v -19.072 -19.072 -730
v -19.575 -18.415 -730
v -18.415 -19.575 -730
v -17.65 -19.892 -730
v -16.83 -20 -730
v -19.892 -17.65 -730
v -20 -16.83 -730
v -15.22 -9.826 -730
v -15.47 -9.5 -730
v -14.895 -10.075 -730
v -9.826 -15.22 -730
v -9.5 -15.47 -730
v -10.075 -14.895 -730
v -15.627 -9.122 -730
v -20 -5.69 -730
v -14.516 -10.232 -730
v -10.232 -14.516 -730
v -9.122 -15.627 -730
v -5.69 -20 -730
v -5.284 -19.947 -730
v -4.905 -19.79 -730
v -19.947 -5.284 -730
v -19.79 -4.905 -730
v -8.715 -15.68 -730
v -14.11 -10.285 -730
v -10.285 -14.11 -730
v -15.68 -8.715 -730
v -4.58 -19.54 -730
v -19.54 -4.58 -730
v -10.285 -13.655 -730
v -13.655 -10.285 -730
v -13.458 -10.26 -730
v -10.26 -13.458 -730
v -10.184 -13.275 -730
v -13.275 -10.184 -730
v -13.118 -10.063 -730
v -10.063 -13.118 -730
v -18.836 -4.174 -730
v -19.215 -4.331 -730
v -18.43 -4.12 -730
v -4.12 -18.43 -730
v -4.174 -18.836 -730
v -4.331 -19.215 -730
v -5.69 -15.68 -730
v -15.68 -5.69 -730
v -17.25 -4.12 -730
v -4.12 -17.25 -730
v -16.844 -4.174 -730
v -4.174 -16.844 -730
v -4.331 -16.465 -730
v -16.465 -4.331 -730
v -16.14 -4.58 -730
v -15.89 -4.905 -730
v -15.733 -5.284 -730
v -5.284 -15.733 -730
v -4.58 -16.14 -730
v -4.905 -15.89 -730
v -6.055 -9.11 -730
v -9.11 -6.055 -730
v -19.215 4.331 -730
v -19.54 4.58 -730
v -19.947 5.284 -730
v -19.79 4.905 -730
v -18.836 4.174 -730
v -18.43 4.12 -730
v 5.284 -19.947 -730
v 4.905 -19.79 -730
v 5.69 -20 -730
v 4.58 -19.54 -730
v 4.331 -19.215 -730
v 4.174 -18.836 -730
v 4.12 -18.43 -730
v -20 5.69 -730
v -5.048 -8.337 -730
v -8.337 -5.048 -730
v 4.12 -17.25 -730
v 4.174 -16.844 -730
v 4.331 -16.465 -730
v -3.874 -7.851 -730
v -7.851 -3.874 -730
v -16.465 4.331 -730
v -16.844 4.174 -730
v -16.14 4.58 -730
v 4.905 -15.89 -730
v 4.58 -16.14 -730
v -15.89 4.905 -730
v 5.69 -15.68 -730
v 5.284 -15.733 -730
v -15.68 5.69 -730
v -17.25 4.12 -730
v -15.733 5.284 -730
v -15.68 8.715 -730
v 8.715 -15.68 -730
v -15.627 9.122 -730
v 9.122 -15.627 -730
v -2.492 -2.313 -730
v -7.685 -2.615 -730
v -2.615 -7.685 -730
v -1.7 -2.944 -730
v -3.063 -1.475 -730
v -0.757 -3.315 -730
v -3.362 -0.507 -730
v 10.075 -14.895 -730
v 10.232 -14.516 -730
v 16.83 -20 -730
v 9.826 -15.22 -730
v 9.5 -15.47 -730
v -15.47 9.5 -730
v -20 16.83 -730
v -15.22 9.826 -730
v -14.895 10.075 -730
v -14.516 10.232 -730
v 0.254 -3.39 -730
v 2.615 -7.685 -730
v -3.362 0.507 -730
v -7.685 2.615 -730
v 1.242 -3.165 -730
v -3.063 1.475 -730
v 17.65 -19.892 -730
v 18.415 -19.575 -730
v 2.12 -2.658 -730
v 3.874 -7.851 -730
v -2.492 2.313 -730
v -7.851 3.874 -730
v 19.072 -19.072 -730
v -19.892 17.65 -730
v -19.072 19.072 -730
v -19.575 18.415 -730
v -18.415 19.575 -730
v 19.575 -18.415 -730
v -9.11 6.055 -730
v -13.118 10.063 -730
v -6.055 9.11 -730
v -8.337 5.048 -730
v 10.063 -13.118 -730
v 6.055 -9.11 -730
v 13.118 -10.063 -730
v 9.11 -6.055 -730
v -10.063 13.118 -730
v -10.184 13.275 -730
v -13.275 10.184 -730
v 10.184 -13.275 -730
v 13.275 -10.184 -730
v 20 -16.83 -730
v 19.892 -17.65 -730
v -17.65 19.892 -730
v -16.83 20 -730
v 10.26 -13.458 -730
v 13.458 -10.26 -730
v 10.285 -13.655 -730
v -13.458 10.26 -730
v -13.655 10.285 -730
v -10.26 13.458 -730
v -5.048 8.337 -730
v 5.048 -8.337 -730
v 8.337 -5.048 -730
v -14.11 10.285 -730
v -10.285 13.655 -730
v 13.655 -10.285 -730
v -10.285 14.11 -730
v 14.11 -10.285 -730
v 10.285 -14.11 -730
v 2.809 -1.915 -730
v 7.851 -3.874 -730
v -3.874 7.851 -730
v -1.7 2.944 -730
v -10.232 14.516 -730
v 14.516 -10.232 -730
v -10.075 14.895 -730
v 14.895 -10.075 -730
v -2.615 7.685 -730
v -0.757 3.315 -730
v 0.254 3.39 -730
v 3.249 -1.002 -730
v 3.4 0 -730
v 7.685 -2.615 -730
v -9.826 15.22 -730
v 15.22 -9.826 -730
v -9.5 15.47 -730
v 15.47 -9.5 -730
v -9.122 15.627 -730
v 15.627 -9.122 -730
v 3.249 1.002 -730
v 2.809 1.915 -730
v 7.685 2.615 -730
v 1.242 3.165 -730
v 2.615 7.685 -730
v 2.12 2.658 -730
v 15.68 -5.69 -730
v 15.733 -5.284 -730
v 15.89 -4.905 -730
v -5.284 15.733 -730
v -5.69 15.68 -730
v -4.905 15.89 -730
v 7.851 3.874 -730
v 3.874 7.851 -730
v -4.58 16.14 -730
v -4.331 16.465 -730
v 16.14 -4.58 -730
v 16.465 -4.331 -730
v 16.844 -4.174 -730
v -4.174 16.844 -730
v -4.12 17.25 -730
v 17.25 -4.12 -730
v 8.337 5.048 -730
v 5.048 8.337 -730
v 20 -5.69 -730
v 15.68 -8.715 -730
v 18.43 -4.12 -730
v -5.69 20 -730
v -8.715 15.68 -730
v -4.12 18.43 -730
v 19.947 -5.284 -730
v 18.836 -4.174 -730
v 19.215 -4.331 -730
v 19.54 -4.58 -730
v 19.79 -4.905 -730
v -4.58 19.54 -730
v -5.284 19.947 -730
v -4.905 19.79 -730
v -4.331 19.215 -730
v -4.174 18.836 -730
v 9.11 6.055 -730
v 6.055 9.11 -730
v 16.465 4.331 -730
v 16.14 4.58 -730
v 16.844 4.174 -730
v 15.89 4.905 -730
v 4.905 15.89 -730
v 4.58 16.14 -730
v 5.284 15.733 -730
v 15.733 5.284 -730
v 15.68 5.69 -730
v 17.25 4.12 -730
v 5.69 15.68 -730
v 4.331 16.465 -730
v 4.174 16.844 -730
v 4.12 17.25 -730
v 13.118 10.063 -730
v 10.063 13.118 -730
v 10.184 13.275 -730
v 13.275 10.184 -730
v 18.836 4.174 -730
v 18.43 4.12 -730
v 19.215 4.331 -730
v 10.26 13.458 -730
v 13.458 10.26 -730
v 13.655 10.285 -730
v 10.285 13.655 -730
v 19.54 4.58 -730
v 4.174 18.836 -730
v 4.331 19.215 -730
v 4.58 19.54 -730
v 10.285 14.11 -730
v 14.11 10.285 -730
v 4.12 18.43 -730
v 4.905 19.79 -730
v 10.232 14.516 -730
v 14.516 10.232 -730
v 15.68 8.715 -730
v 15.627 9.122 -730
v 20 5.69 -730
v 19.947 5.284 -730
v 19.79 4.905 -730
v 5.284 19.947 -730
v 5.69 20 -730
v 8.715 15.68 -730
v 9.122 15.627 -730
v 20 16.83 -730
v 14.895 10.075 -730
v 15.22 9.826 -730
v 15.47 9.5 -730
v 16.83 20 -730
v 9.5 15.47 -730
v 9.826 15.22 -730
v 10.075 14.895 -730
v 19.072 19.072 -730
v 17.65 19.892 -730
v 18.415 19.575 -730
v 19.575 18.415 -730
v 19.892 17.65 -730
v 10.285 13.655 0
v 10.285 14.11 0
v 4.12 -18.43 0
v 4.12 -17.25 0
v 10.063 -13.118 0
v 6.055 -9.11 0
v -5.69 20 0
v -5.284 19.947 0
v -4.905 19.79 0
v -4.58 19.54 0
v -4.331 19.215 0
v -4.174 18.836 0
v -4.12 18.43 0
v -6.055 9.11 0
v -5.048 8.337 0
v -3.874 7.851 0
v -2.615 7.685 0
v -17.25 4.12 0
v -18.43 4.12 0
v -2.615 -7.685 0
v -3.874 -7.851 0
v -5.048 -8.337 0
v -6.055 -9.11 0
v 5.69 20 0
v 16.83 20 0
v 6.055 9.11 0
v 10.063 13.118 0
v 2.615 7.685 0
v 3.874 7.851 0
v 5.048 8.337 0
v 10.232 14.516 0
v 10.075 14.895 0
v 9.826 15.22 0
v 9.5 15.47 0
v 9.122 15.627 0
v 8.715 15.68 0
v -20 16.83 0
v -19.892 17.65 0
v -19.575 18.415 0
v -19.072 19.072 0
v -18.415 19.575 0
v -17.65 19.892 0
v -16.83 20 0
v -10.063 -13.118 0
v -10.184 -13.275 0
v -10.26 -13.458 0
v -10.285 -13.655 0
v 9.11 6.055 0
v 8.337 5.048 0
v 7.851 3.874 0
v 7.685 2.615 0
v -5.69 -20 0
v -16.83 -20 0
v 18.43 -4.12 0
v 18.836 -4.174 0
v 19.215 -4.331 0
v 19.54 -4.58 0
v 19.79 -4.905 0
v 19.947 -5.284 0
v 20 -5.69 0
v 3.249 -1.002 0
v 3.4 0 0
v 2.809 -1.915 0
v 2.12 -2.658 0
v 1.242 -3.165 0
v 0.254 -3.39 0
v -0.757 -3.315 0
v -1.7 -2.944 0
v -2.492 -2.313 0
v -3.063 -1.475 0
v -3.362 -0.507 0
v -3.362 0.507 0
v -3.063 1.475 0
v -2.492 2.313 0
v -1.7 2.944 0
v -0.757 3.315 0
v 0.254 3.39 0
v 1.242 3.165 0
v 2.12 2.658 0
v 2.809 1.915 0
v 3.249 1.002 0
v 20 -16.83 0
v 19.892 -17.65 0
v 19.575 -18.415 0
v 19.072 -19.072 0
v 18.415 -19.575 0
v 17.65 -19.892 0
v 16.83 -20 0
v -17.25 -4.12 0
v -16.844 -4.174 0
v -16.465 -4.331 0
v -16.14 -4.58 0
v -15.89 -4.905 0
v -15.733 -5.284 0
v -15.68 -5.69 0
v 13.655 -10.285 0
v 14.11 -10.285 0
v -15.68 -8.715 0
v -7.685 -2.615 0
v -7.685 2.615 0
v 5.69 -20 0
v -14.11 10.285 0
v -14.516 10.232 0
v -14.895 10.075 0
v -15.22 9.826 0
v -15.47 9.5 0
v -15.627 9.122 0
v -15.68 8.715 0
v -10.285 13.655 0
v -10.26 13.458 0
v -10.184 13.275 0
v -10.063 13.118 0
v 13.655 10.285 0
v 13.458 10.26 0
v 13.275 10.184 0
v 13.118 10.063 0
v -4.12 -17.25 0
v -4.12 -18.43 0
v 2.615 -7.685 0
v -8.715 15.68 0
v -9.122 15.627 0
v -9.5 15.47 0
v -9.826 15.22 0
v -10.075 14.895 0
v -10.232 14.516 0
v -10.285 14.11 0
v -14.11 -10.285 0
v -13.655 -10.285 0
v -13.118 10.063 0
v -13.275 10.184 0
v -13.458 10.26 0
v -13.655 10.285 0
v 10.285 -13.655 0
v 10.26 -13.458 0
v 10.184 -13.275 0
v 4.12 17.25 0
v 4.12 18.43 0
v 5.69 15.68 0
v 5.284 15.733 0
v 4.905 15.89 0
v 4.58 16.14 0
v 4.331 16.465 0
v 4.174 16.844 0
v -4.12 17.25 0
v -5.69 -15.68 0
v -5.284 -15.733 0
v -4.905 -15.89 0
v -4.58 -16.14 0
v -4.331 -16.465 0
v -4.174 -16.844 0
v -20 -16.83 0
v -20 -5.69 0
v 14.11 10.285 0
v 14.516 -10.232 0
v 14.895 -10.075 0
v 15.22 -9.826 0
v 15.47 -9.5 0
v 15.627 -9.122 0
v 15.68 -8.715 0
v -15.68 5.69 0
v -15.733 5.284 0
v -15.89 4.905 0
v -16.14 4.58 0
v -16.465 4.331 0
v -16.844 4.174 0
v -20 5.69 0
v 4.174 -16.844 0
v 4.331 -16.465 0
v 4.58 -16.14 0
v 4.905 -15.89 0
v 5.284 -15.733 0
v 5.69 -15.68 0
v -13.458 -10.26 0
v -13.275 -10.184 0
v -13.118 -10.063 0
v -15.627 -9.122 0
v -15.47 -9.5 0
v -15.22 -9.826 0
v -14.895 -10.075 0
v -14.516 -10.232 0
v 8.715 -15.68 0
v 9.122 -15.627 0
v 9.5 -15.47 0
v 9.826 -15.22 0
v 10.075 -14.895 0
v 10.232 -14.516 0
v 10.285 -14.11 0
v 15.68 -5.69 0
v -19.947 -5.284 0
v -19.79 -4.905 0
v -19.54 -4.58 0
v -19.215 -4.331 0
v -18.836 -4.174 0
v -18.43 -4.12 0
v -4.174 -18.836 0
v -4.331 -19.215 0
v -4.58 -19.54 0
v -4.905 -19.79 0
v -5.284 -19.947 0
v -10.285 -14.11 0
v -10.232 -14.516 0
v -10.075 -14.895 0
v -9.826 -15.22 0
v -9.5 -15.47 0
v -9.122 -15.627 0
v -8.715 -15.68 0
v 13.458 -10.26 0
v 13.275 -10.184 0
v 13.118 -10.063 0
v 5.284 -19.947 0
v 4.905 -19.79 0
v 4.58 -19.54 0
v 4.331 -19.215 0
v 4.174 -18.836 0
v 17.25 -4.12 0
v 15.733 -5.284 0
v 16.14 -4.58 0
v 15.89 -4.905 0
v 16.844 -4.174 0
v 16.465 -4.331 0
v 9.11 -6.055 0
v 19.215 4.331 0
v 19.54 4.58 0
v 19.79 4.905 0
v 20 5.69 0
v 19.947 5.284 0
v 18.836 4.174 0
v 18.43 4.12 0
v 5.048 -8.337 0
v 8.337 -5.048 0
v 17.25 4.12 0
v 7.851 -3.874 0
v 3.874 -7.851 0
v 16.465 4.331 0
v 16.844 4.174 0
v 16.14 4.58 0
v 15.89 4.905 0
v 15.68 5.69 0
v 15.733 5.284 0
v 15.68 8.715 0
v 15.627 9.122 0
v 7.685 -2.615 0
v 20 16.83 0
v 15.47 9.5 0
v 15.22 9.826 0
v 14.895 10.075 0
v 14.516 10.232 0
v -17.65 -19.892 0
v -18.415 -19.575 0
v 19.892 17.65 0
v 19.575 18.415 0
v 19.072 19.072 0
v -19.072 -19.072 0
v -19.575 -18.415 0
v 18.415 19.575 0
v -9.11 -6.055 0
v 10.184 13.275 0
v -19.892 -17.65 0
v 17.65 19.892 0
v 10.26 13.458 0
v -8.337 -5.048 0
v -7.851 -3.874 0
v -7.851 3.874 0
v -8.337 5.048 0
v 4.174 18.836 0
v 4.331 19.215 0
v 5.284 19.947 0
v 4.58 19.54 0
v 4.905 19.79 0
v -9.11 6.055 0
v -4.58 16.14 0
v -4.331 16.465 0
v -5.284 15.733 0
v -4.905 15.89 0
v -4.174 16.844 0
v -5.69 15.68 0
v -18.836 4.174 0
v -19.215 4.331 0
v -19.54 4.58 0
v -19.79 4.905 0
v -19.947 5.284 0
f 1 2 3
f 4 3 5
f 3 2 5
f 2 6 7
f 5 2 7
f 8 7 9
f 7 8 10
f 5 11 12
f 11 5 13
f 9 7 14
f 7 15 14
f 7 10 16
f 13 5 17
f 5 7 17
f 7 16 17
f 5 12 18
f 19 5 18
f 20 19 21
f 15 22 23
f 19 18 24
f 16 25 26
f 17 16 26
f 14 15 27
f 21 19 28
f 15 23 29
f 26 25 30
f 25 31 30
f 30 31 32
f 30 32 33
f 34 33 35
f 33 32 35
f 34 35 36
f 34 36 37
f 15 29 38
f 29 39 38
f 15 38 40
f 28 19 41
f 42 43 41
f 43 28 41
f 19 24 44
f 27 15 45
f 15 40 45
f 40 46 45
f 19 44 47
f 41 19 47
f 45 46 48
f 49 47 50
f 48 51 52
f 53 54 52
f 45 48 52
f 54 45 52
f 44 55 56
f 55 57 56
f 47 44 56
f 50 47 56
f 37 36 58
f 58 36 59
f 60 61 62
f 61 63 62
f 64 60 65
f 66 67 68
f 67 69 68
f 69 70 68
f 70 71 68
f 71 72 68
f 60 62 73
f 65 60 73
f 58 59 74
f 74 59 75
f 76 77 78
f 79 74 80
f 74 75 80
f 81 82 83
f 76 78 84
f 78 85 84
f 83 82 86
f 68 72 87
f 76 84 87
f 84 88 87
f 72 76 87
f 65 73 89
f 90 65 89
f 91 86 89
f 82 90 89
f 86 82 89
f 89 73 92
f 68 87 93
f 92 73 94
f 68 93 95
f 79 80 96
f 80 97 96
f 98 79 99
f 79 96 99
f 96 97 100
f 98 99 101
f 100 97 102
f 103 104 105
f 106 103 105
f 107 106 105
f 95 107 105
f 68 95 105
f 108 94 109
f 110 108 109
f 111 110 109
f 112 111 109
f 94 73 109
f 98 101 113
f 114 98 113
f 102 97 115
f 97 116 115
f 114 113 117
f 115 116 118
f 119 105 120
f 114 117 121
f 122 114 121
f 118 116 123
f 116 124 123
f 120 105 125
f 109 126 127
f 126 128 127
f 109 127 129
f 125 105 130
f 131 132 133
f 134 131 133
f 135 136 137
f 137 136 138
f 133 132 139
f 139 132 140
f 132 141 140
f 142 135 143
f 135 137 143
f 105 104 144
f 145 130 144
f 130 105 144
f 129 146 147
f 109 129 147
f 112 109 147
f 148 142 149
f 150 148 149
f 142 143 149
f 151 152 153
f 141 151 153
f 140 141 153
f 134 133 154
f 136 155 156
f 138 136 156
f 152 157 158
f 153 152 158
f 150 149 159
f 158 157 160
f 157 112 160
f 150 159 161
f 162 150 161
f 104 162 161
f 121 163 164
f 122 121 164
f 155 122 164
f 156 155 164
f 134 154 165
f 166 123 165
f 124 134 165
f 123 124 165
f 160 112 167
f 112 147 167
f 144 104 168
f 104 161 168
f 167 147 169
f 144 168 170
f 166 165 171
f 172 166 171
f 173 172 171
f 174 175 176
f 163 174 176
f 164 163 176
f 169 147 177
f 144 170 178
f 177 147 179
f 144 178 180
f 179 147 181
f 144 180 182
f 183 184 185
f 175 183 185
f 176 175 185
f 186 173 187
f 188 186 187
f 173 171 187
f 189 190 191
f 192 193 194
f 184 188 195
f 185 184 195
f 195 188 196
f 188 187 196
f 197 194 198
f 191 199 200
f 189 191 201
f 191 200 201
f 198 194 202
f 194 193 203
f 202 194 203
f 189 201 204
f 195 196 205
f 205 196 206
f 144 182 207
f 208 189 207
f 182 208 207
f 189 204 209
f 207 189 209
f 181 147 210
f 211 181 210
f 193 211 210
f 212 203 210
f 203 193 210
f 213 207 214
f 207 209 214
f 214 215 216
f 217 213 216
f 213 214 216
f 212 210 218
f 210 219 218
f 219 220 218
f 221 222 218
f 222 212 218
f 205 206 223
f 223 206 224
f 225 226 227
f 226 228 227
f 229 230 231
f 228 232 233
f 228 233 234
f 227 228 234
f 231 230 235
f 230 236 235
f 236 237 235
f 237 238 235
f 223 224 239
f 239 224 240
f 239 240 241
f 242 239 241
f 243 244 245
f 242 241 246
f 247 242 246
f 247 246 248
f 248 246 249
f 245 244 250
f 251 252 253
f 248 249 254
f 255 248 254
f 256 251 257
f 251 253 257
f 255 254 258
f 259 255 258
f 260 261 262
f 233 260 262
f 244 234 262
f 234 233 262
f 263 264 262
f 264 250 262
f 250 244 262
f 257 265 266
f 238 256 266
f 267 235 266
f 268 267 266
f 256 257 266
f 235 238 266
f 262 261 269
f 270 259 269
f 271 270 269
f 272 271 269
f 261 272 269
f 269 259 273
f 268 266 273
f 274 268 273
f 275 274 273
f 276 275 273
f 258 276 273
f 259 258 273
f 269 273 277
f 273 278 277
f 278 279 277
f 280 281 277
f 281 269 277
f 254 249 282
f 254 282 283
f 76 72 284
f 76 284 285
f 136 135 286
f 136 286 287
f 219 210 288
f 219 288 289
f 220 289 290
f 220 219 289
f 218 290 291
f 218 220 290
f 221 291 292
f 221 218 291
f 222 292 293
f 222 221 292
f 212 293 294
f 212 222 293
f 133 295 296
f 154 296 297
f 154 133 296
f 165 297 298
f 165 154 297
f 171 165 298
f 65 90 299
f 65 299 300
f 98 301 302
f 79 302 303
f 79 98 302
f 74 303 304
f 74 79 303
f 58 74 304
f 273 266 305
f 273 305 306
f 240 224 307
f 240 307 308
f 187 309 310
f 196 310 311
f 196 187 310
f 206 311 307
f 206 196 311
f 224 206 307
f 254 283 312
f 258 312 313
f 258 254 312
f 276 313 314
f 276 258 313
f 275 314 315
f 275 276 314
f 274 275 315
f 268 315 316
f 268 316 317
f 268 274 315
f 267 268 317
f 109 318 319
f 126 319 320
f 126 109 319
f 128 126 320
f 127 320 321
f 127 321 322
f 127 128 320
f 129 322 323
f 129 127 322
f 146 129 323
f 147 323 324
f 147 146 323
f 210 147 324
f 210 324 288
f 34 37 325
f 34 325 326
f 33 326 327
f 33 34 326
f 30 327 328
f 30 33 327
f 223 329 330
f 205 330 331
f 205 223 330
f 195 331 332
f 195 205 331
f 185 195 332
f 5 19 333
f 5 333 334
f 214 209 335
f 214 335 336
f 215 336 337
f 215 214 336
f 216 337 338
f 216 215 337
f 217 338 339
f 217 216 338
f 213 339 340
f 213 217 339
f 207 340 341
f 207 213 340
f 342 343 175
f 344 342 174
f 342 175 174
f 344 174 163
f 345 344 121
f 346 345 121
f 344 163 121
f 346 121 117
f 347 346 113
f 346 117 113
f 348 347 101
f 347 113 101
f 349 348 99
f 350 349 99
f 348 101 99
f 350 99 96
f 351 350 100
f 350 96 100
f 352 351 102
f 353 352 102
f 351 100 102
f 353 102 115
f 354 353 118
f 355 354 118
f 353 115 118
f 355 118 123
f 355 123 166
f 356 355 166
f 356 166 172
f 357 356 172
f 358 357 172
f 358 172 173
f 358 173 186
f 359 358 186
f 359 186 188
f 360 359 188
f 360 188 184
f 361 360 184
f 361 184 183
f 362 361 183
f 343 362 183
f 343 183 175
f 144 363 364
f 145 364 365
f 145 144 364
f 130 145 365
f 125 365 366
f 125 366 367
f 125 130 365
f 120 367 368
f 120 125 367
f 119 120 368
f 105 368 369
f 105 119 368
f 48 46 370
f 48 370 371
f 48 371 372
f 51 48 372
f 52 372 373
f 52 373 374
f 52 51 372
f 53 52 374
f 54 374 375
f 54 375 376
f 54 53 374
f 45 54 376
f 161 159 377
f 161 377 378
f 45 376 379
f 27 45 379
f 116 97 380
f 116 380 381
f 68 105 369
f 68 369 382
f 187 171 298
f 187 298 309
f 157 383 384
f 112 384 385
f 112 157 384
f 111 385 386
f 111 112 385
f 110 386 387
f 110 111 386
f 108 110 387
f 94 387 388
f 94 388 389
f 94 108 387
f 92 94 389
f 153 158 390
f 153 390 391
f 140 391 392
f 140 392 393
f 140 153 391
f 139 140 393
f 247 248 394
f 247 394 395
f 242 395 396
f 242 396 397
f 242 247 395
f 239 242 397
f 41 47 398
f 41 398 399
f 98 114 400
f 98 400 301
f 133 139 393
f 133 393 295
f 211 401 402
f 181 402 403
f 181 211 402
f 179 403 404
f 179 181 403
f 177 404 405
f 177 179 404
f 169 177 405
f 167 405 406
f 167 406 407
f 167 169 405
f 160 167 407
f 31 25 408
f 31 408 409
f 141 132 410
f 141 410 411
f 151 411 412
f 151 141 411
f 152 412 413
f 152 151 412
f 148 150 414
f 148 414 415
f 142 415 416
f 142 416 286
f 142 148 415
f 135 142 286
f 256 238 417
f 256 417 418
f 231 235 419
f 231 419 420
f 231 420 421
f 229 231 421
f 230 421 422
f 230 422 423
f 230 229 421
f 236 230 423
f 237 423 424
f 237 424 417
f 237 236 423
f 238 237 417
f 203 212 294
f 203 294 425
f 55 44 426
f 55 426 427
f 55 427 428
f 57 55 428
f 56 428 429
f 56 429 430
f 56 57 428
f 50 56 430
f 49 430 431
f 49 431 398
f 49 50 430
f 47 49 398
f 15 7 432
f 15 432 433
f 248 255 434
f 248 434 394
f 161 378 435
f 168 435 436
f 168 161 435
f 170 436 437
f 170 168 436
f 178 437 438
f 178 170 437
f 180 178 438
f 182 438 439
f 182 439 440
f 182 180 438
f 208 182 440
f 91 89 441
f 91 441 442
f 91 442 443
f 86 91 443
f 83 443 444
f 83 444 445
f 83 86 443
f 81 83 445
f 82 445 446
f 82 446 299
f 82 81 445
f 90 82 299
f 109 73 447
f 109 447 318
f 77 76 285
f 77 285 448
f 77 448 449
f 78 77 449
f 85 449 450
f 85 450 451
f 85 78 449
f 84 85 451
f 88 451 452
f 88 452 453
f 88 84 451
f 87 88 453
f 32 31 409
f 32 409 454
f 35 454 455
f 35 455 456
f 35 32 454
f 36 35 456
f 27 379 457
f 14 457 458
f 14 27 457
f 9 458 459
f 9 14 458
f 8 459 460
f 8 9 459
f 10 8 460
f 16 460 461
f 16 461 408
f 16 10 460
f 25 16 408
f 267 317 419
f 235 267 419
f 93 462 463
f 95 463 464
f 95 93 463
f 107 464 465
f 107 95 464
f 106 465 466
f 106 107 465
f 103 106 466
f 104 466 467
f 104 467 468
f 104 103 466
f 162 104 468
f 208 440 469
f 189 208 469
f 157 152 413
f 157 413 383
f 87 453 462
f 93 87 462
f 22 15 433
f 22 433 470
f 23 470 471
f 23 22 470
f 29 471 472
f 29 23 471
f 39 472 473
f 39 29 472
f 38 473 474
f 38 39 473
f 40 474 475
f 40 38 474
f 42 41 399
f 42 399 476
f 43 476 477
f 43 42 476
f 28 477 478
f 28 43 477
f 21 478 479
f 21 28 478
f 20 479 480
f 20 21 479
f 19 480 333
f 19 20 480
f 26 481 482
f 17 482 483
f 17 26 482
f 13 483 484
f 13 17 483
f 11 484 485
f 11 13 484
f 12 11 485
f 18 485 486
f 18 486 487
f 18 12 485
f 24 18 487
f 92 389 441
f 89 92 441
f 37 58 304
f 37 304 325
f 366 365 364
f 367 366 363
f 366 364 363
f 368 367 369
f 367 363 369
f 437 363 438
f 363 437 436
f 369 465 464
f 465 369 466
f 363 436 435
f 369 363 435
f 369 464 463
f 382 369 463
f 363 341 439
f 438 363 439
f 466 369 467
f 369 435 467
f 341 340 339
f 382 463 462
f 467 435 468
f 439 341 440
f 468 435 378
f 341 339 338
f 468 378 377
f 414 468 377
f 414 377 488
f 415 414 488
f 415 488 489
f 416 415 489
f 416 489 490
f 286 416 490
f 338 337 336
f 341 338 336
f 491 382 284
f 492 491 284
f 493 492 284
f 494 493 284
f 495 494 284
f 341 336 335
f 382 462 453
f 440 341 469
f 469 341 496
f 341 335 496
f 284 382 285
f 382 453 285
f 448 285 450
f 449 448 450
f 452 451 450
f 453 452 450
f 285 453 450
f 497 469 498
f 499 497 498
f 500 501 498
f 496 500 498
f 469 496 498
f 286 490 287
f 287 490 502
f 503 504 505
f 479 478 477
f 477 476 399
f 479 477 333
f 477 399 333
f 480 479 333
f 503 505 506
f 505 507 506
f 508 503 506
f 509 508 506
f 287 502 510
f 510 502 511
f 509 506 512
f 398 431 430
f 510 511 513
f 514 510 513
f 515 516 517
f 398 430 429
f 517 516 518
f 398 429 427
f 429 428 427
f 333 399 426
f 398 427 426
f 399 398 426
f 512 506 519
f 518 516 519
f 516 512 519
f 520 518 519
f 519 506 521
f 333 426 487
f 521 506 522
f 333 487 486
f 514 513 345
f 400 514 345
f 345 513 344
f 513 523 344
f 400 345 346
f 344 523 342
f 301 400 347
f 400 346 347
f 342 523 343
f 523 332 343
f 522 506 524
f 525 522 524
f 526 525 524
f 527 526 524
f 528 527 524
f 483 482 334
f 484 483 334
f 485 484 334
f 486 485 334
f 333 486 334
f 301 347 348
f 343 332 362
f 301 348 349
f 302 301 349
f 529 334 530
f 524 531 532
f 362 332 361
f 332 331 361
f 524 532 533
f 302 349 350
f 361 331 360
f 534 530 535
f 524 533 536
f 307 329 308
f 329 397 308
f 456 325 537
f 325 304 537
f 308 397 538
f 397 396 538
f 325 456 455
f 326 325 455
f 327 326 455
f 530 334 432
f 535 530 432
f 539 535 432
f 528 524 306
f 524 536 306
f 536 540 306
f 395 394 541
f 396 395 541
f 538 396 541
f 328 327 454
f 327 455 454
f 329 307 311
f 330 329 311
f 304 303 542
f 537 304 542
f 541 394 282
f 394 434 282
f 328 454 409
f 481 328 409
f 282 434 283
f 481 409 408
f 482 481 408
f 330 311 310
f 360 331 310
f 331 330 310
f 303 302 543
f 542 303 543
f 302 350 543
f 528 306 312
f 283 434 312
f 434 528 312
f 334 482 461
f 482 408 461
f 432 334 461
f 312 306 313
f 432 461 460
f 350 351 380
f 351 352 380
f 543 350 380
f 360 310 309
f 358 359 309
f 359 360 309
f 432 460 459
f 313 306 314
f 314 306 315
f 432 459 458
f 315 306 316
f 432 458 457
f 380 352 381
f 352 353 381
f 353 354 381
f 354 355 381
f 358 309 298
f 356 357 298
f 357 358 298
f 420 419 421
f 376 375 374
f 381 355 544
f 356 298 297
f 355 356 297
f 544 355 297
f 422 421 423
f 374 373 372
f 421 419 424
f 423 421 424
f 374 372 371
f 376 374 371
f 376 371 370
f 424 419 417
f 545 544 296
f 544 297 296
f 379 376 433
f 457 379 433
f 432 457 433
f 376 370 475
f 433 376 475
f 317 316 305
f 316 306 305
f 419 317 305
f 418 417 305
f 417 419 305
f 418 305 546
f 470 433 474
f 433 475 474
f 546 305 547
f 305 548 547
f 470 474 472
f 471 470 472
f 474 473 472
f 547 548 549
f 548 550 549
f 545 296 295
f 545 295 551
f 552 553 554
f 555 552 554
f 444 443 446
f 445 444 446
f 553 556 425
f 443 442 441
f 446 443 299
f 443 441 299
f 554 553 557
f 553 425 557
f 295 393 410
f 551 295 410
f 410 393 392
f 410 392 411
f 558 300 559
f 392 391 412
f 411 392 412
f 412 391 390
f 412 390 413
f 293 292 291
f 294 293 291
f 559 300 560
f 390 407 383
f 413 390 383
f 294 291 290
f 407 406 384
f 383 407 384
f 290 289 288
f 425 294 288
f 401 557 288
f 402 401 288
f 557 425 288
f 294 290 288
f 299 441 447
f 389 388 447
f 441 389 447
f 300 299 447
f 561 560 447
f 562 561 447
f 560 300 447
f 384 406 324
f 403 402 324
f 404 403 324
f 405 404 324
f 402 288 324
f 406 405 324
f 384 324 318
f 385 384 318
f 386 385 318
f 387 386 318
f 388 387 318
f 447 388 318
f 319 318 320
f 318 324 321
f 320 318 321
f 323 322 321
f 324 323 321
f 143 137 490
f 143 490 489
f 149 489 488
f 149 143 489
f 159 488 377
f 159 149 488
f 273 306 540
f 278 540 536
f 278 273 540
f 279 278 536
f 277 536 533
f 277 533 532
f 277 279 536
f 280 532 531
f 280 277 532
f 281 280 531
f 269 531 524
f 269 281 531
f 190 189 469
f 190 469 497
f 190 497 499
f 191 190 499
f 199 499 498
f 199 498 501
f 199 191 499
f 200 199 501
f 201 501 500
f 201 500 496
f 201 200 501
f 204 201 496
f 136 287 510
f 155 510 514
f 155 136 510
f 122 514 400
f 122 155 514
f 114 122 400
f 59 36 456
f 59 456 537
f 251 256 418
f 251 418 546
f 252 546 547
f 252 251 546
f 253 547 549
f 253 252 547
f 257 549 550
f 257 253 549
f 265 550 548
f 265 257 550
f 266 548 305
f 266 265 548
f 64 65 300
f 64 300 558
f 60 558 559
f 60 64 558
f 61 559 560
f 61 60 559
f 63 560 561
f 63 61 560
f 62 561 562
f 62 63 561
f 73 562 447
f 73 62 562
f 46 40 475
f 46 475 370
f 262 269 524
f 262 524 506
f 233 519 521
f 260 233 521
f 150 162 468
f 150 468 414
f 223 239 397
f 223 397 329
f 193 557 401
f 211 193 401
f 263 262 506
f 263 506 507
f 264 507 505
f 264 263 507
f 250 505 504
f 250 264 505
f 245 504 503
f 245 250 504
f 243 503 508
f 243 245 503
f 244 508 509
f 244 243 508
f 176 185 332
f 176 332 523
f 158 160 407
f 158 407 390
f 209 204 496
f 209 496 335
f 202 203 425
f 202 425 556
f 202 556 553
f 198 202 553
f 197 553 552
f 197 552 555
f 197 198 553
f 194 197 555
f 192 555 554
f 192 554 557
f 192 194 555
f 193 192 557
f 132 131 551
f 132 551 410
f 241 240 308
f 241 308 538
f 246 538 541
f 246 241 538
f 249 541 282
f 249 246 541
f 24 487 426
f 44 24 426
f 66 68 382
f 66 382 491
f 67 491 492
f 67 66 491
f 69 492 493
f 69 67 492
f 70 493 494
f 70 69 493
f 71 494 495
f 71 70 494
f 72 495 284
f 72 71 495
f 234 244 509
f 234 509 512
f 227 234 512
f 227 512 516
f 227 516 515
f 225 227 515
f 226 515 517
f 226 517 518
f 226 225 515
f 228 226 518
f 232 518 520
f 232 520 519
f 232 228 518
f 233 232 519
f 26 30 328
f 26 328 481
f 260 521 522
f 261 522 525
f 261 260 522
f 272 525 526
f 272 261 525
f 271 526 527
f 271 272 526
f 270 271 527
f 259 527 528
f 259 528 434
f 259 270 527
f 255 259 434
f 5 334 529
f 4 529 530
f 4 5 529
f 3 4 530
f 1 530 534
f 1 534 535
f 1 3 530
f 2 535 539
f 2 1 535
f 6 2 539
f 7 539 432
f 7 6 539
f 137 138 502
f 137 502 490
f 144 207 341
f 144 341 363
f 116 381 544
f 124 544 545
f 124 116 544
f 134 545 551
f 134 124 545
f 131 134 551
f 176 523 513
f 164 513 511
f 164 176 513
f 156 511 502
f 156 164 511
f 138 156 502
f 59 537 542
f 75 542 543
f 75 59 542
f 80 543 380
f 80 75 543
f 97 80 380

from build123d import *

# Parameters (mm, degrees)
SKETCH1_R           = 3.4
BOSS_EXTRUDE1_DEPTH = 4000
SKETCH2_W           = 84.539567645
SKETCH2_H           = 98.688701394
CUT_EXTRUDE1_DEPTH  = 3271.122321871


with BuildPart() as part:
    # Sketch1 → Boss-Extrude1 (new body)
    with BuildSketch(Plane(origin=(0, 0, -4000), x_dir=(-1, 0, 0), z_dir=(0, 0, -1))):
        with BuildLine():
            Line((16.83, 20), (5.69044933, 20))
            ThreePointArc((5.69044933, 20), (4.580291684, 19.540157646), (4.12044933, 18.43))
            Line((4.12044933, 18.43), (4.12044933, 17.25))
            ThreePointArc((4.12044933, 17.25), (4.580291684, 16.139842354), (5.69044933, 15.68))
            Line((5.69044933, 15.68), (8.7153995, 15.68))
            ThreePointArc((8.7153995, 15.68), (9.825557146, 15.220157646), (10.2853995, 14.11))
            Line((10.2853995, 14.11), (10.2853995, 13.654903102))
            ThreePointArc((10.2853995, 13.654903102), (10.227547945, 13.364063694), (10.062800654, 13.117501948))
            Line((10.062800654, 13.117501948), (6.055092794, 9.109794088))
            ThreePointArc((6.055092794, 9.109794088), (4.47691877, 8.055291919), (2.615335582, 7.685))
            Line((2.615335582, 7.685), (-2.615335582, 7.685))
            ThreePointArc((-2.615335582, 7.685), (-4.47691877, 8.055291919), (-6.055092794, 9.109794088))
            Line((-6.055092794, 9.109794088), (-10.062800654, 13.117501948))
            ThreePointArc((-10.062800654, 13.117501948), (-10.227547945, 13.364063694), (-10.2853995, 13.654903102))
            Line((-10.2853995, 13.654903102), (-10.2853995, 14.11))
            ThreePointArc((-10.2853995, 14.11), (-9.825557146, 15.220157646), (-8.7153995, 15.68))
            Line((-8.7153995, 15.68), (-5.69044933, 15.68))
            ThreePointArc((-5.69044933, 15.68), (-4.580291684, 16.139842354), (-4.12044933, 17.25))
            Line((-4.12044933, 17.25), (-4.12044933, 18.43))
            ThreePointArc((-4.12044933, 18.43), (-4.580291684, 19.540157646), (-5.69044933, 20))
            Line((-5.69044933, 20), (-16.83, 20))
            ThreePointArc((-16.83, 20), (-19.071528496, 19.071528496), (-20, 16.83))
            Line((-20, 16.83), (-20, 5.69044933))
            ThreePointArc((-20, 5.69044933), (-19.540157646, 4.580291684), (-18.43, 4.12044933))
            Line((-18.43, 4.12044933), (-17.25, 4.12044933))
            ThreePointArc((-17.25, 4.12044933), (-16.139842354, 4.580291684), (-15.68, 5.69044933))
            Line((-15.68, 5.69044933), (-15.68, 8.7153995))
            ThreePointArc((-15.68, 8.7153995), (-15.220157646, 9.825557146), (-14.11, 10.2853995))
            Line((-14.11, 10.2853995), (-13.654903102, 10.2853995))
            ThreePointArc((-13.654903102, 10.2853995), (-13.364063694, 10.227547945), (-13.117501948, 10.062800654))
            Line((-13.117501948, 10.062800654), (-9.109794088, 6.055092794))
            ThreePointArc((-9.109794088, 6.055092794), (-8.055291919, 4.47691877), (-7.685, 2.615335582))
            Line((-7.685, 2.615335582), (-7.685, -2.615335582))
            ThreePointArc((-7.685, -2.615335582), (-8.055291919, -4.47691877), (-9.109794088, -6.055092794))
            Line((-9.109794088, -6.055092794), (-13.117501948, -10.062800654))
            ThreePointArc((-13.117501948, -10.062800654), (-13.364063694, -10.227547945), (-13.654903102, -10.2853995))
            Line((-13.654903102, -10.2853995), (-14.11, -10.2853995))
            ThreePointArc((-14.11, -10.2853995), (-15.220157646, -9.825557146), (-15.68, -8.7153995))
            Line((-15.68, -8.7153995), (-15.68, -5.69044933))
            ThreePointArc((-15.68, -5.69044933), (-16.139842354, -4.580291684), (-17.25, -4.12044933))
            Line((-17.25, -4.12044933), (-18.43, -4.12044933))
            ThreePointArc((-18.43, -4.12044933), (-19.540157646, -4.580291684), (-20, -5.69044933))
            Line((-20, -5.69044933), (-20, -16.83))
            ThreePointArc((-20, -16.83), (-19.071528496, -19.071528496), (-16.83, -20))
            Line((-16.83, -20), (-5.69044933, -20))
            ThreePointArc((-5.69044933, -20), (-4.580291684, -19.540157646), (-4.12044933, -18.43))
            Line((-4.12044933, -18.43), (-4.12044933, -17.25))
            ThreePointArc((-4.12044933, -17.25), (-4.580291684, -16.139842354), (-5.69044933, -15.68))
            Line((-5.69044933, -15.68), (-8.7153995, -15.68))
            ThreePointArc((-8.7153995, -15.68), (-9.825557146, -15.220157646), (-10.2853995, -14.11))
            Line((-10.2853995, -14.11), (-10.2853995, -13.654903102))
            ThreePointArc((-10.2853995, -13.654903102), (-10.227547945, -13.364063694), (-10.062800654, -13.117501948))
            Line((-10.062800654, -13.117501948), (-6.055092794, -9.109794088))
            ThreePointArc((-6.055092794, -9.109794088), (-4.47691877, -8.055291919), (-2.615335582, -7.685))
            Line((-2.615335582, -7.685), (2.615335582, -7.685))
            ThreePointArc((2.615335582, -7.685), (4.47691877, -8.055291919), (6.055092794, -9.109794088))
            Line((6.055092794, -9.109794088), (10.062800654, -13.117501948))
            ThreePointArc((10.062800654, -13.117501948), (10.227547945, -13.364063694), (10.2853995, -13.654903102))
            Line((10.2853995, -13.654903102), (10.2853995, -14.11))
            ThreePointArc((10.2853995, -14.11), (9.825557146, -15.220157646), (8.7153995, -15.68))
            Line((8.7153995, -15.68), (5.69044933, -15.68))
            ThreePointArc((5.69044933, -15.68), (4.580291684, -16.139842354), (4.12044933, -17.25))
            Line((4.12044933, -17.25), (4.12044933, -18.43))
            ThreePointArc((4.12044933, -18.43), (4.580291684, -19.540157646), (5.69044933, -20))
            Line((5.69044933, -20), (16.83, -20))
            ThreePointArc((16.83, -20), (19.071528496, -19.071528496), (20, -16.83))
            Line((20, -16.83), (20, -5.69044933))
            ThreePointArc((20, -5.69044933), (19.540157646, -4.580291684), (18.43, -4.12044933))
            Line((18.43, -4.12044933), (17.25, -4.12044933))
            ThreePointArc((17.25, -4.12044933), (16.139842354, -4.580291684), (15.68, -5.69044933))
            Line((15.68, -5.69044933), (15.68, -8.7153995))
            ThreePointArc((15.68, -8.7153995), (15.220157646, -9.825557146), (14.11, -10.2853995))
            Line((14.11, -10.2853995), (13.654903102, -10.2853995))
            ThreePointArc((13.654903102, -10.2853995), (13.364063694, -10.227547945), (13.117501948, -10.062800654))
            Line((13.117501948, -10.062800654), (9.109794088, -6.055092794))
            ThreePointArc((9.109794088, -6.055092794), (8.055291919, -4.47691877), (7.685, -2.615335582))
            Line((7.685, -2.615335582), (7.685, 2.615335582))
            ThreePointArc((7.685, 2.615335582), (8.055291919, 4.47691877), (9.109794088, 6.055092794))
            Line((9.109794088, 6.055092794), (13.117501948, 10.062800654))
            ThreePointArc((13.117501948, 10.062800654), (13.364063694, 10.227547945), (13.654903102, 10.2853995))
            Line((13.654903102, 10.2853995), (14.11, 10.2853995))
            ThreePointArc((14.11, 10.2853995), (15.220157646, 9.825557146), (15.68, 8.7153995))
            Line((15.68, 8.7153995), (15.68, 5.69044933))
            ThreePointArc((15.68, 5.69044933), (16.139842354, 4.580291684), (17.25, 4.12044933))
            Line((17.25, 4.12044933), (18.43, 4.12044933))
            ThreePointArc((18.43, 4.12044933), (19.540157646, 4.580291684), (20, 5.69044933))
            Line((20, 5.69044933), (20, 16.83))
            ThreePointArc((20, 16.83), (19.071528496, 19.071528496), (16.83, 20))
        make_face()
        with Locations(Location((0, 0, 0), (0, 0, 180))):
            Circle(SKETCH1_R, mode=Mode.SUBTRACT)
    extrude(amount=-BOSS_EXTRUDE1_DEPTH)

    # Sketch2 → Cut-Extrude1 (cut, through all)
    with BuildSketch(Plane.XY.offset(-730)):
        with Locations((6.865320367, -4.171878069)):
            Rectangle(SKETCH2_W, SKETCH2_H)
    extrude(amount=-CUT_EXTRUDE1_DEPTH, mode=Mode.SUBTRACT)


solid = part.part
